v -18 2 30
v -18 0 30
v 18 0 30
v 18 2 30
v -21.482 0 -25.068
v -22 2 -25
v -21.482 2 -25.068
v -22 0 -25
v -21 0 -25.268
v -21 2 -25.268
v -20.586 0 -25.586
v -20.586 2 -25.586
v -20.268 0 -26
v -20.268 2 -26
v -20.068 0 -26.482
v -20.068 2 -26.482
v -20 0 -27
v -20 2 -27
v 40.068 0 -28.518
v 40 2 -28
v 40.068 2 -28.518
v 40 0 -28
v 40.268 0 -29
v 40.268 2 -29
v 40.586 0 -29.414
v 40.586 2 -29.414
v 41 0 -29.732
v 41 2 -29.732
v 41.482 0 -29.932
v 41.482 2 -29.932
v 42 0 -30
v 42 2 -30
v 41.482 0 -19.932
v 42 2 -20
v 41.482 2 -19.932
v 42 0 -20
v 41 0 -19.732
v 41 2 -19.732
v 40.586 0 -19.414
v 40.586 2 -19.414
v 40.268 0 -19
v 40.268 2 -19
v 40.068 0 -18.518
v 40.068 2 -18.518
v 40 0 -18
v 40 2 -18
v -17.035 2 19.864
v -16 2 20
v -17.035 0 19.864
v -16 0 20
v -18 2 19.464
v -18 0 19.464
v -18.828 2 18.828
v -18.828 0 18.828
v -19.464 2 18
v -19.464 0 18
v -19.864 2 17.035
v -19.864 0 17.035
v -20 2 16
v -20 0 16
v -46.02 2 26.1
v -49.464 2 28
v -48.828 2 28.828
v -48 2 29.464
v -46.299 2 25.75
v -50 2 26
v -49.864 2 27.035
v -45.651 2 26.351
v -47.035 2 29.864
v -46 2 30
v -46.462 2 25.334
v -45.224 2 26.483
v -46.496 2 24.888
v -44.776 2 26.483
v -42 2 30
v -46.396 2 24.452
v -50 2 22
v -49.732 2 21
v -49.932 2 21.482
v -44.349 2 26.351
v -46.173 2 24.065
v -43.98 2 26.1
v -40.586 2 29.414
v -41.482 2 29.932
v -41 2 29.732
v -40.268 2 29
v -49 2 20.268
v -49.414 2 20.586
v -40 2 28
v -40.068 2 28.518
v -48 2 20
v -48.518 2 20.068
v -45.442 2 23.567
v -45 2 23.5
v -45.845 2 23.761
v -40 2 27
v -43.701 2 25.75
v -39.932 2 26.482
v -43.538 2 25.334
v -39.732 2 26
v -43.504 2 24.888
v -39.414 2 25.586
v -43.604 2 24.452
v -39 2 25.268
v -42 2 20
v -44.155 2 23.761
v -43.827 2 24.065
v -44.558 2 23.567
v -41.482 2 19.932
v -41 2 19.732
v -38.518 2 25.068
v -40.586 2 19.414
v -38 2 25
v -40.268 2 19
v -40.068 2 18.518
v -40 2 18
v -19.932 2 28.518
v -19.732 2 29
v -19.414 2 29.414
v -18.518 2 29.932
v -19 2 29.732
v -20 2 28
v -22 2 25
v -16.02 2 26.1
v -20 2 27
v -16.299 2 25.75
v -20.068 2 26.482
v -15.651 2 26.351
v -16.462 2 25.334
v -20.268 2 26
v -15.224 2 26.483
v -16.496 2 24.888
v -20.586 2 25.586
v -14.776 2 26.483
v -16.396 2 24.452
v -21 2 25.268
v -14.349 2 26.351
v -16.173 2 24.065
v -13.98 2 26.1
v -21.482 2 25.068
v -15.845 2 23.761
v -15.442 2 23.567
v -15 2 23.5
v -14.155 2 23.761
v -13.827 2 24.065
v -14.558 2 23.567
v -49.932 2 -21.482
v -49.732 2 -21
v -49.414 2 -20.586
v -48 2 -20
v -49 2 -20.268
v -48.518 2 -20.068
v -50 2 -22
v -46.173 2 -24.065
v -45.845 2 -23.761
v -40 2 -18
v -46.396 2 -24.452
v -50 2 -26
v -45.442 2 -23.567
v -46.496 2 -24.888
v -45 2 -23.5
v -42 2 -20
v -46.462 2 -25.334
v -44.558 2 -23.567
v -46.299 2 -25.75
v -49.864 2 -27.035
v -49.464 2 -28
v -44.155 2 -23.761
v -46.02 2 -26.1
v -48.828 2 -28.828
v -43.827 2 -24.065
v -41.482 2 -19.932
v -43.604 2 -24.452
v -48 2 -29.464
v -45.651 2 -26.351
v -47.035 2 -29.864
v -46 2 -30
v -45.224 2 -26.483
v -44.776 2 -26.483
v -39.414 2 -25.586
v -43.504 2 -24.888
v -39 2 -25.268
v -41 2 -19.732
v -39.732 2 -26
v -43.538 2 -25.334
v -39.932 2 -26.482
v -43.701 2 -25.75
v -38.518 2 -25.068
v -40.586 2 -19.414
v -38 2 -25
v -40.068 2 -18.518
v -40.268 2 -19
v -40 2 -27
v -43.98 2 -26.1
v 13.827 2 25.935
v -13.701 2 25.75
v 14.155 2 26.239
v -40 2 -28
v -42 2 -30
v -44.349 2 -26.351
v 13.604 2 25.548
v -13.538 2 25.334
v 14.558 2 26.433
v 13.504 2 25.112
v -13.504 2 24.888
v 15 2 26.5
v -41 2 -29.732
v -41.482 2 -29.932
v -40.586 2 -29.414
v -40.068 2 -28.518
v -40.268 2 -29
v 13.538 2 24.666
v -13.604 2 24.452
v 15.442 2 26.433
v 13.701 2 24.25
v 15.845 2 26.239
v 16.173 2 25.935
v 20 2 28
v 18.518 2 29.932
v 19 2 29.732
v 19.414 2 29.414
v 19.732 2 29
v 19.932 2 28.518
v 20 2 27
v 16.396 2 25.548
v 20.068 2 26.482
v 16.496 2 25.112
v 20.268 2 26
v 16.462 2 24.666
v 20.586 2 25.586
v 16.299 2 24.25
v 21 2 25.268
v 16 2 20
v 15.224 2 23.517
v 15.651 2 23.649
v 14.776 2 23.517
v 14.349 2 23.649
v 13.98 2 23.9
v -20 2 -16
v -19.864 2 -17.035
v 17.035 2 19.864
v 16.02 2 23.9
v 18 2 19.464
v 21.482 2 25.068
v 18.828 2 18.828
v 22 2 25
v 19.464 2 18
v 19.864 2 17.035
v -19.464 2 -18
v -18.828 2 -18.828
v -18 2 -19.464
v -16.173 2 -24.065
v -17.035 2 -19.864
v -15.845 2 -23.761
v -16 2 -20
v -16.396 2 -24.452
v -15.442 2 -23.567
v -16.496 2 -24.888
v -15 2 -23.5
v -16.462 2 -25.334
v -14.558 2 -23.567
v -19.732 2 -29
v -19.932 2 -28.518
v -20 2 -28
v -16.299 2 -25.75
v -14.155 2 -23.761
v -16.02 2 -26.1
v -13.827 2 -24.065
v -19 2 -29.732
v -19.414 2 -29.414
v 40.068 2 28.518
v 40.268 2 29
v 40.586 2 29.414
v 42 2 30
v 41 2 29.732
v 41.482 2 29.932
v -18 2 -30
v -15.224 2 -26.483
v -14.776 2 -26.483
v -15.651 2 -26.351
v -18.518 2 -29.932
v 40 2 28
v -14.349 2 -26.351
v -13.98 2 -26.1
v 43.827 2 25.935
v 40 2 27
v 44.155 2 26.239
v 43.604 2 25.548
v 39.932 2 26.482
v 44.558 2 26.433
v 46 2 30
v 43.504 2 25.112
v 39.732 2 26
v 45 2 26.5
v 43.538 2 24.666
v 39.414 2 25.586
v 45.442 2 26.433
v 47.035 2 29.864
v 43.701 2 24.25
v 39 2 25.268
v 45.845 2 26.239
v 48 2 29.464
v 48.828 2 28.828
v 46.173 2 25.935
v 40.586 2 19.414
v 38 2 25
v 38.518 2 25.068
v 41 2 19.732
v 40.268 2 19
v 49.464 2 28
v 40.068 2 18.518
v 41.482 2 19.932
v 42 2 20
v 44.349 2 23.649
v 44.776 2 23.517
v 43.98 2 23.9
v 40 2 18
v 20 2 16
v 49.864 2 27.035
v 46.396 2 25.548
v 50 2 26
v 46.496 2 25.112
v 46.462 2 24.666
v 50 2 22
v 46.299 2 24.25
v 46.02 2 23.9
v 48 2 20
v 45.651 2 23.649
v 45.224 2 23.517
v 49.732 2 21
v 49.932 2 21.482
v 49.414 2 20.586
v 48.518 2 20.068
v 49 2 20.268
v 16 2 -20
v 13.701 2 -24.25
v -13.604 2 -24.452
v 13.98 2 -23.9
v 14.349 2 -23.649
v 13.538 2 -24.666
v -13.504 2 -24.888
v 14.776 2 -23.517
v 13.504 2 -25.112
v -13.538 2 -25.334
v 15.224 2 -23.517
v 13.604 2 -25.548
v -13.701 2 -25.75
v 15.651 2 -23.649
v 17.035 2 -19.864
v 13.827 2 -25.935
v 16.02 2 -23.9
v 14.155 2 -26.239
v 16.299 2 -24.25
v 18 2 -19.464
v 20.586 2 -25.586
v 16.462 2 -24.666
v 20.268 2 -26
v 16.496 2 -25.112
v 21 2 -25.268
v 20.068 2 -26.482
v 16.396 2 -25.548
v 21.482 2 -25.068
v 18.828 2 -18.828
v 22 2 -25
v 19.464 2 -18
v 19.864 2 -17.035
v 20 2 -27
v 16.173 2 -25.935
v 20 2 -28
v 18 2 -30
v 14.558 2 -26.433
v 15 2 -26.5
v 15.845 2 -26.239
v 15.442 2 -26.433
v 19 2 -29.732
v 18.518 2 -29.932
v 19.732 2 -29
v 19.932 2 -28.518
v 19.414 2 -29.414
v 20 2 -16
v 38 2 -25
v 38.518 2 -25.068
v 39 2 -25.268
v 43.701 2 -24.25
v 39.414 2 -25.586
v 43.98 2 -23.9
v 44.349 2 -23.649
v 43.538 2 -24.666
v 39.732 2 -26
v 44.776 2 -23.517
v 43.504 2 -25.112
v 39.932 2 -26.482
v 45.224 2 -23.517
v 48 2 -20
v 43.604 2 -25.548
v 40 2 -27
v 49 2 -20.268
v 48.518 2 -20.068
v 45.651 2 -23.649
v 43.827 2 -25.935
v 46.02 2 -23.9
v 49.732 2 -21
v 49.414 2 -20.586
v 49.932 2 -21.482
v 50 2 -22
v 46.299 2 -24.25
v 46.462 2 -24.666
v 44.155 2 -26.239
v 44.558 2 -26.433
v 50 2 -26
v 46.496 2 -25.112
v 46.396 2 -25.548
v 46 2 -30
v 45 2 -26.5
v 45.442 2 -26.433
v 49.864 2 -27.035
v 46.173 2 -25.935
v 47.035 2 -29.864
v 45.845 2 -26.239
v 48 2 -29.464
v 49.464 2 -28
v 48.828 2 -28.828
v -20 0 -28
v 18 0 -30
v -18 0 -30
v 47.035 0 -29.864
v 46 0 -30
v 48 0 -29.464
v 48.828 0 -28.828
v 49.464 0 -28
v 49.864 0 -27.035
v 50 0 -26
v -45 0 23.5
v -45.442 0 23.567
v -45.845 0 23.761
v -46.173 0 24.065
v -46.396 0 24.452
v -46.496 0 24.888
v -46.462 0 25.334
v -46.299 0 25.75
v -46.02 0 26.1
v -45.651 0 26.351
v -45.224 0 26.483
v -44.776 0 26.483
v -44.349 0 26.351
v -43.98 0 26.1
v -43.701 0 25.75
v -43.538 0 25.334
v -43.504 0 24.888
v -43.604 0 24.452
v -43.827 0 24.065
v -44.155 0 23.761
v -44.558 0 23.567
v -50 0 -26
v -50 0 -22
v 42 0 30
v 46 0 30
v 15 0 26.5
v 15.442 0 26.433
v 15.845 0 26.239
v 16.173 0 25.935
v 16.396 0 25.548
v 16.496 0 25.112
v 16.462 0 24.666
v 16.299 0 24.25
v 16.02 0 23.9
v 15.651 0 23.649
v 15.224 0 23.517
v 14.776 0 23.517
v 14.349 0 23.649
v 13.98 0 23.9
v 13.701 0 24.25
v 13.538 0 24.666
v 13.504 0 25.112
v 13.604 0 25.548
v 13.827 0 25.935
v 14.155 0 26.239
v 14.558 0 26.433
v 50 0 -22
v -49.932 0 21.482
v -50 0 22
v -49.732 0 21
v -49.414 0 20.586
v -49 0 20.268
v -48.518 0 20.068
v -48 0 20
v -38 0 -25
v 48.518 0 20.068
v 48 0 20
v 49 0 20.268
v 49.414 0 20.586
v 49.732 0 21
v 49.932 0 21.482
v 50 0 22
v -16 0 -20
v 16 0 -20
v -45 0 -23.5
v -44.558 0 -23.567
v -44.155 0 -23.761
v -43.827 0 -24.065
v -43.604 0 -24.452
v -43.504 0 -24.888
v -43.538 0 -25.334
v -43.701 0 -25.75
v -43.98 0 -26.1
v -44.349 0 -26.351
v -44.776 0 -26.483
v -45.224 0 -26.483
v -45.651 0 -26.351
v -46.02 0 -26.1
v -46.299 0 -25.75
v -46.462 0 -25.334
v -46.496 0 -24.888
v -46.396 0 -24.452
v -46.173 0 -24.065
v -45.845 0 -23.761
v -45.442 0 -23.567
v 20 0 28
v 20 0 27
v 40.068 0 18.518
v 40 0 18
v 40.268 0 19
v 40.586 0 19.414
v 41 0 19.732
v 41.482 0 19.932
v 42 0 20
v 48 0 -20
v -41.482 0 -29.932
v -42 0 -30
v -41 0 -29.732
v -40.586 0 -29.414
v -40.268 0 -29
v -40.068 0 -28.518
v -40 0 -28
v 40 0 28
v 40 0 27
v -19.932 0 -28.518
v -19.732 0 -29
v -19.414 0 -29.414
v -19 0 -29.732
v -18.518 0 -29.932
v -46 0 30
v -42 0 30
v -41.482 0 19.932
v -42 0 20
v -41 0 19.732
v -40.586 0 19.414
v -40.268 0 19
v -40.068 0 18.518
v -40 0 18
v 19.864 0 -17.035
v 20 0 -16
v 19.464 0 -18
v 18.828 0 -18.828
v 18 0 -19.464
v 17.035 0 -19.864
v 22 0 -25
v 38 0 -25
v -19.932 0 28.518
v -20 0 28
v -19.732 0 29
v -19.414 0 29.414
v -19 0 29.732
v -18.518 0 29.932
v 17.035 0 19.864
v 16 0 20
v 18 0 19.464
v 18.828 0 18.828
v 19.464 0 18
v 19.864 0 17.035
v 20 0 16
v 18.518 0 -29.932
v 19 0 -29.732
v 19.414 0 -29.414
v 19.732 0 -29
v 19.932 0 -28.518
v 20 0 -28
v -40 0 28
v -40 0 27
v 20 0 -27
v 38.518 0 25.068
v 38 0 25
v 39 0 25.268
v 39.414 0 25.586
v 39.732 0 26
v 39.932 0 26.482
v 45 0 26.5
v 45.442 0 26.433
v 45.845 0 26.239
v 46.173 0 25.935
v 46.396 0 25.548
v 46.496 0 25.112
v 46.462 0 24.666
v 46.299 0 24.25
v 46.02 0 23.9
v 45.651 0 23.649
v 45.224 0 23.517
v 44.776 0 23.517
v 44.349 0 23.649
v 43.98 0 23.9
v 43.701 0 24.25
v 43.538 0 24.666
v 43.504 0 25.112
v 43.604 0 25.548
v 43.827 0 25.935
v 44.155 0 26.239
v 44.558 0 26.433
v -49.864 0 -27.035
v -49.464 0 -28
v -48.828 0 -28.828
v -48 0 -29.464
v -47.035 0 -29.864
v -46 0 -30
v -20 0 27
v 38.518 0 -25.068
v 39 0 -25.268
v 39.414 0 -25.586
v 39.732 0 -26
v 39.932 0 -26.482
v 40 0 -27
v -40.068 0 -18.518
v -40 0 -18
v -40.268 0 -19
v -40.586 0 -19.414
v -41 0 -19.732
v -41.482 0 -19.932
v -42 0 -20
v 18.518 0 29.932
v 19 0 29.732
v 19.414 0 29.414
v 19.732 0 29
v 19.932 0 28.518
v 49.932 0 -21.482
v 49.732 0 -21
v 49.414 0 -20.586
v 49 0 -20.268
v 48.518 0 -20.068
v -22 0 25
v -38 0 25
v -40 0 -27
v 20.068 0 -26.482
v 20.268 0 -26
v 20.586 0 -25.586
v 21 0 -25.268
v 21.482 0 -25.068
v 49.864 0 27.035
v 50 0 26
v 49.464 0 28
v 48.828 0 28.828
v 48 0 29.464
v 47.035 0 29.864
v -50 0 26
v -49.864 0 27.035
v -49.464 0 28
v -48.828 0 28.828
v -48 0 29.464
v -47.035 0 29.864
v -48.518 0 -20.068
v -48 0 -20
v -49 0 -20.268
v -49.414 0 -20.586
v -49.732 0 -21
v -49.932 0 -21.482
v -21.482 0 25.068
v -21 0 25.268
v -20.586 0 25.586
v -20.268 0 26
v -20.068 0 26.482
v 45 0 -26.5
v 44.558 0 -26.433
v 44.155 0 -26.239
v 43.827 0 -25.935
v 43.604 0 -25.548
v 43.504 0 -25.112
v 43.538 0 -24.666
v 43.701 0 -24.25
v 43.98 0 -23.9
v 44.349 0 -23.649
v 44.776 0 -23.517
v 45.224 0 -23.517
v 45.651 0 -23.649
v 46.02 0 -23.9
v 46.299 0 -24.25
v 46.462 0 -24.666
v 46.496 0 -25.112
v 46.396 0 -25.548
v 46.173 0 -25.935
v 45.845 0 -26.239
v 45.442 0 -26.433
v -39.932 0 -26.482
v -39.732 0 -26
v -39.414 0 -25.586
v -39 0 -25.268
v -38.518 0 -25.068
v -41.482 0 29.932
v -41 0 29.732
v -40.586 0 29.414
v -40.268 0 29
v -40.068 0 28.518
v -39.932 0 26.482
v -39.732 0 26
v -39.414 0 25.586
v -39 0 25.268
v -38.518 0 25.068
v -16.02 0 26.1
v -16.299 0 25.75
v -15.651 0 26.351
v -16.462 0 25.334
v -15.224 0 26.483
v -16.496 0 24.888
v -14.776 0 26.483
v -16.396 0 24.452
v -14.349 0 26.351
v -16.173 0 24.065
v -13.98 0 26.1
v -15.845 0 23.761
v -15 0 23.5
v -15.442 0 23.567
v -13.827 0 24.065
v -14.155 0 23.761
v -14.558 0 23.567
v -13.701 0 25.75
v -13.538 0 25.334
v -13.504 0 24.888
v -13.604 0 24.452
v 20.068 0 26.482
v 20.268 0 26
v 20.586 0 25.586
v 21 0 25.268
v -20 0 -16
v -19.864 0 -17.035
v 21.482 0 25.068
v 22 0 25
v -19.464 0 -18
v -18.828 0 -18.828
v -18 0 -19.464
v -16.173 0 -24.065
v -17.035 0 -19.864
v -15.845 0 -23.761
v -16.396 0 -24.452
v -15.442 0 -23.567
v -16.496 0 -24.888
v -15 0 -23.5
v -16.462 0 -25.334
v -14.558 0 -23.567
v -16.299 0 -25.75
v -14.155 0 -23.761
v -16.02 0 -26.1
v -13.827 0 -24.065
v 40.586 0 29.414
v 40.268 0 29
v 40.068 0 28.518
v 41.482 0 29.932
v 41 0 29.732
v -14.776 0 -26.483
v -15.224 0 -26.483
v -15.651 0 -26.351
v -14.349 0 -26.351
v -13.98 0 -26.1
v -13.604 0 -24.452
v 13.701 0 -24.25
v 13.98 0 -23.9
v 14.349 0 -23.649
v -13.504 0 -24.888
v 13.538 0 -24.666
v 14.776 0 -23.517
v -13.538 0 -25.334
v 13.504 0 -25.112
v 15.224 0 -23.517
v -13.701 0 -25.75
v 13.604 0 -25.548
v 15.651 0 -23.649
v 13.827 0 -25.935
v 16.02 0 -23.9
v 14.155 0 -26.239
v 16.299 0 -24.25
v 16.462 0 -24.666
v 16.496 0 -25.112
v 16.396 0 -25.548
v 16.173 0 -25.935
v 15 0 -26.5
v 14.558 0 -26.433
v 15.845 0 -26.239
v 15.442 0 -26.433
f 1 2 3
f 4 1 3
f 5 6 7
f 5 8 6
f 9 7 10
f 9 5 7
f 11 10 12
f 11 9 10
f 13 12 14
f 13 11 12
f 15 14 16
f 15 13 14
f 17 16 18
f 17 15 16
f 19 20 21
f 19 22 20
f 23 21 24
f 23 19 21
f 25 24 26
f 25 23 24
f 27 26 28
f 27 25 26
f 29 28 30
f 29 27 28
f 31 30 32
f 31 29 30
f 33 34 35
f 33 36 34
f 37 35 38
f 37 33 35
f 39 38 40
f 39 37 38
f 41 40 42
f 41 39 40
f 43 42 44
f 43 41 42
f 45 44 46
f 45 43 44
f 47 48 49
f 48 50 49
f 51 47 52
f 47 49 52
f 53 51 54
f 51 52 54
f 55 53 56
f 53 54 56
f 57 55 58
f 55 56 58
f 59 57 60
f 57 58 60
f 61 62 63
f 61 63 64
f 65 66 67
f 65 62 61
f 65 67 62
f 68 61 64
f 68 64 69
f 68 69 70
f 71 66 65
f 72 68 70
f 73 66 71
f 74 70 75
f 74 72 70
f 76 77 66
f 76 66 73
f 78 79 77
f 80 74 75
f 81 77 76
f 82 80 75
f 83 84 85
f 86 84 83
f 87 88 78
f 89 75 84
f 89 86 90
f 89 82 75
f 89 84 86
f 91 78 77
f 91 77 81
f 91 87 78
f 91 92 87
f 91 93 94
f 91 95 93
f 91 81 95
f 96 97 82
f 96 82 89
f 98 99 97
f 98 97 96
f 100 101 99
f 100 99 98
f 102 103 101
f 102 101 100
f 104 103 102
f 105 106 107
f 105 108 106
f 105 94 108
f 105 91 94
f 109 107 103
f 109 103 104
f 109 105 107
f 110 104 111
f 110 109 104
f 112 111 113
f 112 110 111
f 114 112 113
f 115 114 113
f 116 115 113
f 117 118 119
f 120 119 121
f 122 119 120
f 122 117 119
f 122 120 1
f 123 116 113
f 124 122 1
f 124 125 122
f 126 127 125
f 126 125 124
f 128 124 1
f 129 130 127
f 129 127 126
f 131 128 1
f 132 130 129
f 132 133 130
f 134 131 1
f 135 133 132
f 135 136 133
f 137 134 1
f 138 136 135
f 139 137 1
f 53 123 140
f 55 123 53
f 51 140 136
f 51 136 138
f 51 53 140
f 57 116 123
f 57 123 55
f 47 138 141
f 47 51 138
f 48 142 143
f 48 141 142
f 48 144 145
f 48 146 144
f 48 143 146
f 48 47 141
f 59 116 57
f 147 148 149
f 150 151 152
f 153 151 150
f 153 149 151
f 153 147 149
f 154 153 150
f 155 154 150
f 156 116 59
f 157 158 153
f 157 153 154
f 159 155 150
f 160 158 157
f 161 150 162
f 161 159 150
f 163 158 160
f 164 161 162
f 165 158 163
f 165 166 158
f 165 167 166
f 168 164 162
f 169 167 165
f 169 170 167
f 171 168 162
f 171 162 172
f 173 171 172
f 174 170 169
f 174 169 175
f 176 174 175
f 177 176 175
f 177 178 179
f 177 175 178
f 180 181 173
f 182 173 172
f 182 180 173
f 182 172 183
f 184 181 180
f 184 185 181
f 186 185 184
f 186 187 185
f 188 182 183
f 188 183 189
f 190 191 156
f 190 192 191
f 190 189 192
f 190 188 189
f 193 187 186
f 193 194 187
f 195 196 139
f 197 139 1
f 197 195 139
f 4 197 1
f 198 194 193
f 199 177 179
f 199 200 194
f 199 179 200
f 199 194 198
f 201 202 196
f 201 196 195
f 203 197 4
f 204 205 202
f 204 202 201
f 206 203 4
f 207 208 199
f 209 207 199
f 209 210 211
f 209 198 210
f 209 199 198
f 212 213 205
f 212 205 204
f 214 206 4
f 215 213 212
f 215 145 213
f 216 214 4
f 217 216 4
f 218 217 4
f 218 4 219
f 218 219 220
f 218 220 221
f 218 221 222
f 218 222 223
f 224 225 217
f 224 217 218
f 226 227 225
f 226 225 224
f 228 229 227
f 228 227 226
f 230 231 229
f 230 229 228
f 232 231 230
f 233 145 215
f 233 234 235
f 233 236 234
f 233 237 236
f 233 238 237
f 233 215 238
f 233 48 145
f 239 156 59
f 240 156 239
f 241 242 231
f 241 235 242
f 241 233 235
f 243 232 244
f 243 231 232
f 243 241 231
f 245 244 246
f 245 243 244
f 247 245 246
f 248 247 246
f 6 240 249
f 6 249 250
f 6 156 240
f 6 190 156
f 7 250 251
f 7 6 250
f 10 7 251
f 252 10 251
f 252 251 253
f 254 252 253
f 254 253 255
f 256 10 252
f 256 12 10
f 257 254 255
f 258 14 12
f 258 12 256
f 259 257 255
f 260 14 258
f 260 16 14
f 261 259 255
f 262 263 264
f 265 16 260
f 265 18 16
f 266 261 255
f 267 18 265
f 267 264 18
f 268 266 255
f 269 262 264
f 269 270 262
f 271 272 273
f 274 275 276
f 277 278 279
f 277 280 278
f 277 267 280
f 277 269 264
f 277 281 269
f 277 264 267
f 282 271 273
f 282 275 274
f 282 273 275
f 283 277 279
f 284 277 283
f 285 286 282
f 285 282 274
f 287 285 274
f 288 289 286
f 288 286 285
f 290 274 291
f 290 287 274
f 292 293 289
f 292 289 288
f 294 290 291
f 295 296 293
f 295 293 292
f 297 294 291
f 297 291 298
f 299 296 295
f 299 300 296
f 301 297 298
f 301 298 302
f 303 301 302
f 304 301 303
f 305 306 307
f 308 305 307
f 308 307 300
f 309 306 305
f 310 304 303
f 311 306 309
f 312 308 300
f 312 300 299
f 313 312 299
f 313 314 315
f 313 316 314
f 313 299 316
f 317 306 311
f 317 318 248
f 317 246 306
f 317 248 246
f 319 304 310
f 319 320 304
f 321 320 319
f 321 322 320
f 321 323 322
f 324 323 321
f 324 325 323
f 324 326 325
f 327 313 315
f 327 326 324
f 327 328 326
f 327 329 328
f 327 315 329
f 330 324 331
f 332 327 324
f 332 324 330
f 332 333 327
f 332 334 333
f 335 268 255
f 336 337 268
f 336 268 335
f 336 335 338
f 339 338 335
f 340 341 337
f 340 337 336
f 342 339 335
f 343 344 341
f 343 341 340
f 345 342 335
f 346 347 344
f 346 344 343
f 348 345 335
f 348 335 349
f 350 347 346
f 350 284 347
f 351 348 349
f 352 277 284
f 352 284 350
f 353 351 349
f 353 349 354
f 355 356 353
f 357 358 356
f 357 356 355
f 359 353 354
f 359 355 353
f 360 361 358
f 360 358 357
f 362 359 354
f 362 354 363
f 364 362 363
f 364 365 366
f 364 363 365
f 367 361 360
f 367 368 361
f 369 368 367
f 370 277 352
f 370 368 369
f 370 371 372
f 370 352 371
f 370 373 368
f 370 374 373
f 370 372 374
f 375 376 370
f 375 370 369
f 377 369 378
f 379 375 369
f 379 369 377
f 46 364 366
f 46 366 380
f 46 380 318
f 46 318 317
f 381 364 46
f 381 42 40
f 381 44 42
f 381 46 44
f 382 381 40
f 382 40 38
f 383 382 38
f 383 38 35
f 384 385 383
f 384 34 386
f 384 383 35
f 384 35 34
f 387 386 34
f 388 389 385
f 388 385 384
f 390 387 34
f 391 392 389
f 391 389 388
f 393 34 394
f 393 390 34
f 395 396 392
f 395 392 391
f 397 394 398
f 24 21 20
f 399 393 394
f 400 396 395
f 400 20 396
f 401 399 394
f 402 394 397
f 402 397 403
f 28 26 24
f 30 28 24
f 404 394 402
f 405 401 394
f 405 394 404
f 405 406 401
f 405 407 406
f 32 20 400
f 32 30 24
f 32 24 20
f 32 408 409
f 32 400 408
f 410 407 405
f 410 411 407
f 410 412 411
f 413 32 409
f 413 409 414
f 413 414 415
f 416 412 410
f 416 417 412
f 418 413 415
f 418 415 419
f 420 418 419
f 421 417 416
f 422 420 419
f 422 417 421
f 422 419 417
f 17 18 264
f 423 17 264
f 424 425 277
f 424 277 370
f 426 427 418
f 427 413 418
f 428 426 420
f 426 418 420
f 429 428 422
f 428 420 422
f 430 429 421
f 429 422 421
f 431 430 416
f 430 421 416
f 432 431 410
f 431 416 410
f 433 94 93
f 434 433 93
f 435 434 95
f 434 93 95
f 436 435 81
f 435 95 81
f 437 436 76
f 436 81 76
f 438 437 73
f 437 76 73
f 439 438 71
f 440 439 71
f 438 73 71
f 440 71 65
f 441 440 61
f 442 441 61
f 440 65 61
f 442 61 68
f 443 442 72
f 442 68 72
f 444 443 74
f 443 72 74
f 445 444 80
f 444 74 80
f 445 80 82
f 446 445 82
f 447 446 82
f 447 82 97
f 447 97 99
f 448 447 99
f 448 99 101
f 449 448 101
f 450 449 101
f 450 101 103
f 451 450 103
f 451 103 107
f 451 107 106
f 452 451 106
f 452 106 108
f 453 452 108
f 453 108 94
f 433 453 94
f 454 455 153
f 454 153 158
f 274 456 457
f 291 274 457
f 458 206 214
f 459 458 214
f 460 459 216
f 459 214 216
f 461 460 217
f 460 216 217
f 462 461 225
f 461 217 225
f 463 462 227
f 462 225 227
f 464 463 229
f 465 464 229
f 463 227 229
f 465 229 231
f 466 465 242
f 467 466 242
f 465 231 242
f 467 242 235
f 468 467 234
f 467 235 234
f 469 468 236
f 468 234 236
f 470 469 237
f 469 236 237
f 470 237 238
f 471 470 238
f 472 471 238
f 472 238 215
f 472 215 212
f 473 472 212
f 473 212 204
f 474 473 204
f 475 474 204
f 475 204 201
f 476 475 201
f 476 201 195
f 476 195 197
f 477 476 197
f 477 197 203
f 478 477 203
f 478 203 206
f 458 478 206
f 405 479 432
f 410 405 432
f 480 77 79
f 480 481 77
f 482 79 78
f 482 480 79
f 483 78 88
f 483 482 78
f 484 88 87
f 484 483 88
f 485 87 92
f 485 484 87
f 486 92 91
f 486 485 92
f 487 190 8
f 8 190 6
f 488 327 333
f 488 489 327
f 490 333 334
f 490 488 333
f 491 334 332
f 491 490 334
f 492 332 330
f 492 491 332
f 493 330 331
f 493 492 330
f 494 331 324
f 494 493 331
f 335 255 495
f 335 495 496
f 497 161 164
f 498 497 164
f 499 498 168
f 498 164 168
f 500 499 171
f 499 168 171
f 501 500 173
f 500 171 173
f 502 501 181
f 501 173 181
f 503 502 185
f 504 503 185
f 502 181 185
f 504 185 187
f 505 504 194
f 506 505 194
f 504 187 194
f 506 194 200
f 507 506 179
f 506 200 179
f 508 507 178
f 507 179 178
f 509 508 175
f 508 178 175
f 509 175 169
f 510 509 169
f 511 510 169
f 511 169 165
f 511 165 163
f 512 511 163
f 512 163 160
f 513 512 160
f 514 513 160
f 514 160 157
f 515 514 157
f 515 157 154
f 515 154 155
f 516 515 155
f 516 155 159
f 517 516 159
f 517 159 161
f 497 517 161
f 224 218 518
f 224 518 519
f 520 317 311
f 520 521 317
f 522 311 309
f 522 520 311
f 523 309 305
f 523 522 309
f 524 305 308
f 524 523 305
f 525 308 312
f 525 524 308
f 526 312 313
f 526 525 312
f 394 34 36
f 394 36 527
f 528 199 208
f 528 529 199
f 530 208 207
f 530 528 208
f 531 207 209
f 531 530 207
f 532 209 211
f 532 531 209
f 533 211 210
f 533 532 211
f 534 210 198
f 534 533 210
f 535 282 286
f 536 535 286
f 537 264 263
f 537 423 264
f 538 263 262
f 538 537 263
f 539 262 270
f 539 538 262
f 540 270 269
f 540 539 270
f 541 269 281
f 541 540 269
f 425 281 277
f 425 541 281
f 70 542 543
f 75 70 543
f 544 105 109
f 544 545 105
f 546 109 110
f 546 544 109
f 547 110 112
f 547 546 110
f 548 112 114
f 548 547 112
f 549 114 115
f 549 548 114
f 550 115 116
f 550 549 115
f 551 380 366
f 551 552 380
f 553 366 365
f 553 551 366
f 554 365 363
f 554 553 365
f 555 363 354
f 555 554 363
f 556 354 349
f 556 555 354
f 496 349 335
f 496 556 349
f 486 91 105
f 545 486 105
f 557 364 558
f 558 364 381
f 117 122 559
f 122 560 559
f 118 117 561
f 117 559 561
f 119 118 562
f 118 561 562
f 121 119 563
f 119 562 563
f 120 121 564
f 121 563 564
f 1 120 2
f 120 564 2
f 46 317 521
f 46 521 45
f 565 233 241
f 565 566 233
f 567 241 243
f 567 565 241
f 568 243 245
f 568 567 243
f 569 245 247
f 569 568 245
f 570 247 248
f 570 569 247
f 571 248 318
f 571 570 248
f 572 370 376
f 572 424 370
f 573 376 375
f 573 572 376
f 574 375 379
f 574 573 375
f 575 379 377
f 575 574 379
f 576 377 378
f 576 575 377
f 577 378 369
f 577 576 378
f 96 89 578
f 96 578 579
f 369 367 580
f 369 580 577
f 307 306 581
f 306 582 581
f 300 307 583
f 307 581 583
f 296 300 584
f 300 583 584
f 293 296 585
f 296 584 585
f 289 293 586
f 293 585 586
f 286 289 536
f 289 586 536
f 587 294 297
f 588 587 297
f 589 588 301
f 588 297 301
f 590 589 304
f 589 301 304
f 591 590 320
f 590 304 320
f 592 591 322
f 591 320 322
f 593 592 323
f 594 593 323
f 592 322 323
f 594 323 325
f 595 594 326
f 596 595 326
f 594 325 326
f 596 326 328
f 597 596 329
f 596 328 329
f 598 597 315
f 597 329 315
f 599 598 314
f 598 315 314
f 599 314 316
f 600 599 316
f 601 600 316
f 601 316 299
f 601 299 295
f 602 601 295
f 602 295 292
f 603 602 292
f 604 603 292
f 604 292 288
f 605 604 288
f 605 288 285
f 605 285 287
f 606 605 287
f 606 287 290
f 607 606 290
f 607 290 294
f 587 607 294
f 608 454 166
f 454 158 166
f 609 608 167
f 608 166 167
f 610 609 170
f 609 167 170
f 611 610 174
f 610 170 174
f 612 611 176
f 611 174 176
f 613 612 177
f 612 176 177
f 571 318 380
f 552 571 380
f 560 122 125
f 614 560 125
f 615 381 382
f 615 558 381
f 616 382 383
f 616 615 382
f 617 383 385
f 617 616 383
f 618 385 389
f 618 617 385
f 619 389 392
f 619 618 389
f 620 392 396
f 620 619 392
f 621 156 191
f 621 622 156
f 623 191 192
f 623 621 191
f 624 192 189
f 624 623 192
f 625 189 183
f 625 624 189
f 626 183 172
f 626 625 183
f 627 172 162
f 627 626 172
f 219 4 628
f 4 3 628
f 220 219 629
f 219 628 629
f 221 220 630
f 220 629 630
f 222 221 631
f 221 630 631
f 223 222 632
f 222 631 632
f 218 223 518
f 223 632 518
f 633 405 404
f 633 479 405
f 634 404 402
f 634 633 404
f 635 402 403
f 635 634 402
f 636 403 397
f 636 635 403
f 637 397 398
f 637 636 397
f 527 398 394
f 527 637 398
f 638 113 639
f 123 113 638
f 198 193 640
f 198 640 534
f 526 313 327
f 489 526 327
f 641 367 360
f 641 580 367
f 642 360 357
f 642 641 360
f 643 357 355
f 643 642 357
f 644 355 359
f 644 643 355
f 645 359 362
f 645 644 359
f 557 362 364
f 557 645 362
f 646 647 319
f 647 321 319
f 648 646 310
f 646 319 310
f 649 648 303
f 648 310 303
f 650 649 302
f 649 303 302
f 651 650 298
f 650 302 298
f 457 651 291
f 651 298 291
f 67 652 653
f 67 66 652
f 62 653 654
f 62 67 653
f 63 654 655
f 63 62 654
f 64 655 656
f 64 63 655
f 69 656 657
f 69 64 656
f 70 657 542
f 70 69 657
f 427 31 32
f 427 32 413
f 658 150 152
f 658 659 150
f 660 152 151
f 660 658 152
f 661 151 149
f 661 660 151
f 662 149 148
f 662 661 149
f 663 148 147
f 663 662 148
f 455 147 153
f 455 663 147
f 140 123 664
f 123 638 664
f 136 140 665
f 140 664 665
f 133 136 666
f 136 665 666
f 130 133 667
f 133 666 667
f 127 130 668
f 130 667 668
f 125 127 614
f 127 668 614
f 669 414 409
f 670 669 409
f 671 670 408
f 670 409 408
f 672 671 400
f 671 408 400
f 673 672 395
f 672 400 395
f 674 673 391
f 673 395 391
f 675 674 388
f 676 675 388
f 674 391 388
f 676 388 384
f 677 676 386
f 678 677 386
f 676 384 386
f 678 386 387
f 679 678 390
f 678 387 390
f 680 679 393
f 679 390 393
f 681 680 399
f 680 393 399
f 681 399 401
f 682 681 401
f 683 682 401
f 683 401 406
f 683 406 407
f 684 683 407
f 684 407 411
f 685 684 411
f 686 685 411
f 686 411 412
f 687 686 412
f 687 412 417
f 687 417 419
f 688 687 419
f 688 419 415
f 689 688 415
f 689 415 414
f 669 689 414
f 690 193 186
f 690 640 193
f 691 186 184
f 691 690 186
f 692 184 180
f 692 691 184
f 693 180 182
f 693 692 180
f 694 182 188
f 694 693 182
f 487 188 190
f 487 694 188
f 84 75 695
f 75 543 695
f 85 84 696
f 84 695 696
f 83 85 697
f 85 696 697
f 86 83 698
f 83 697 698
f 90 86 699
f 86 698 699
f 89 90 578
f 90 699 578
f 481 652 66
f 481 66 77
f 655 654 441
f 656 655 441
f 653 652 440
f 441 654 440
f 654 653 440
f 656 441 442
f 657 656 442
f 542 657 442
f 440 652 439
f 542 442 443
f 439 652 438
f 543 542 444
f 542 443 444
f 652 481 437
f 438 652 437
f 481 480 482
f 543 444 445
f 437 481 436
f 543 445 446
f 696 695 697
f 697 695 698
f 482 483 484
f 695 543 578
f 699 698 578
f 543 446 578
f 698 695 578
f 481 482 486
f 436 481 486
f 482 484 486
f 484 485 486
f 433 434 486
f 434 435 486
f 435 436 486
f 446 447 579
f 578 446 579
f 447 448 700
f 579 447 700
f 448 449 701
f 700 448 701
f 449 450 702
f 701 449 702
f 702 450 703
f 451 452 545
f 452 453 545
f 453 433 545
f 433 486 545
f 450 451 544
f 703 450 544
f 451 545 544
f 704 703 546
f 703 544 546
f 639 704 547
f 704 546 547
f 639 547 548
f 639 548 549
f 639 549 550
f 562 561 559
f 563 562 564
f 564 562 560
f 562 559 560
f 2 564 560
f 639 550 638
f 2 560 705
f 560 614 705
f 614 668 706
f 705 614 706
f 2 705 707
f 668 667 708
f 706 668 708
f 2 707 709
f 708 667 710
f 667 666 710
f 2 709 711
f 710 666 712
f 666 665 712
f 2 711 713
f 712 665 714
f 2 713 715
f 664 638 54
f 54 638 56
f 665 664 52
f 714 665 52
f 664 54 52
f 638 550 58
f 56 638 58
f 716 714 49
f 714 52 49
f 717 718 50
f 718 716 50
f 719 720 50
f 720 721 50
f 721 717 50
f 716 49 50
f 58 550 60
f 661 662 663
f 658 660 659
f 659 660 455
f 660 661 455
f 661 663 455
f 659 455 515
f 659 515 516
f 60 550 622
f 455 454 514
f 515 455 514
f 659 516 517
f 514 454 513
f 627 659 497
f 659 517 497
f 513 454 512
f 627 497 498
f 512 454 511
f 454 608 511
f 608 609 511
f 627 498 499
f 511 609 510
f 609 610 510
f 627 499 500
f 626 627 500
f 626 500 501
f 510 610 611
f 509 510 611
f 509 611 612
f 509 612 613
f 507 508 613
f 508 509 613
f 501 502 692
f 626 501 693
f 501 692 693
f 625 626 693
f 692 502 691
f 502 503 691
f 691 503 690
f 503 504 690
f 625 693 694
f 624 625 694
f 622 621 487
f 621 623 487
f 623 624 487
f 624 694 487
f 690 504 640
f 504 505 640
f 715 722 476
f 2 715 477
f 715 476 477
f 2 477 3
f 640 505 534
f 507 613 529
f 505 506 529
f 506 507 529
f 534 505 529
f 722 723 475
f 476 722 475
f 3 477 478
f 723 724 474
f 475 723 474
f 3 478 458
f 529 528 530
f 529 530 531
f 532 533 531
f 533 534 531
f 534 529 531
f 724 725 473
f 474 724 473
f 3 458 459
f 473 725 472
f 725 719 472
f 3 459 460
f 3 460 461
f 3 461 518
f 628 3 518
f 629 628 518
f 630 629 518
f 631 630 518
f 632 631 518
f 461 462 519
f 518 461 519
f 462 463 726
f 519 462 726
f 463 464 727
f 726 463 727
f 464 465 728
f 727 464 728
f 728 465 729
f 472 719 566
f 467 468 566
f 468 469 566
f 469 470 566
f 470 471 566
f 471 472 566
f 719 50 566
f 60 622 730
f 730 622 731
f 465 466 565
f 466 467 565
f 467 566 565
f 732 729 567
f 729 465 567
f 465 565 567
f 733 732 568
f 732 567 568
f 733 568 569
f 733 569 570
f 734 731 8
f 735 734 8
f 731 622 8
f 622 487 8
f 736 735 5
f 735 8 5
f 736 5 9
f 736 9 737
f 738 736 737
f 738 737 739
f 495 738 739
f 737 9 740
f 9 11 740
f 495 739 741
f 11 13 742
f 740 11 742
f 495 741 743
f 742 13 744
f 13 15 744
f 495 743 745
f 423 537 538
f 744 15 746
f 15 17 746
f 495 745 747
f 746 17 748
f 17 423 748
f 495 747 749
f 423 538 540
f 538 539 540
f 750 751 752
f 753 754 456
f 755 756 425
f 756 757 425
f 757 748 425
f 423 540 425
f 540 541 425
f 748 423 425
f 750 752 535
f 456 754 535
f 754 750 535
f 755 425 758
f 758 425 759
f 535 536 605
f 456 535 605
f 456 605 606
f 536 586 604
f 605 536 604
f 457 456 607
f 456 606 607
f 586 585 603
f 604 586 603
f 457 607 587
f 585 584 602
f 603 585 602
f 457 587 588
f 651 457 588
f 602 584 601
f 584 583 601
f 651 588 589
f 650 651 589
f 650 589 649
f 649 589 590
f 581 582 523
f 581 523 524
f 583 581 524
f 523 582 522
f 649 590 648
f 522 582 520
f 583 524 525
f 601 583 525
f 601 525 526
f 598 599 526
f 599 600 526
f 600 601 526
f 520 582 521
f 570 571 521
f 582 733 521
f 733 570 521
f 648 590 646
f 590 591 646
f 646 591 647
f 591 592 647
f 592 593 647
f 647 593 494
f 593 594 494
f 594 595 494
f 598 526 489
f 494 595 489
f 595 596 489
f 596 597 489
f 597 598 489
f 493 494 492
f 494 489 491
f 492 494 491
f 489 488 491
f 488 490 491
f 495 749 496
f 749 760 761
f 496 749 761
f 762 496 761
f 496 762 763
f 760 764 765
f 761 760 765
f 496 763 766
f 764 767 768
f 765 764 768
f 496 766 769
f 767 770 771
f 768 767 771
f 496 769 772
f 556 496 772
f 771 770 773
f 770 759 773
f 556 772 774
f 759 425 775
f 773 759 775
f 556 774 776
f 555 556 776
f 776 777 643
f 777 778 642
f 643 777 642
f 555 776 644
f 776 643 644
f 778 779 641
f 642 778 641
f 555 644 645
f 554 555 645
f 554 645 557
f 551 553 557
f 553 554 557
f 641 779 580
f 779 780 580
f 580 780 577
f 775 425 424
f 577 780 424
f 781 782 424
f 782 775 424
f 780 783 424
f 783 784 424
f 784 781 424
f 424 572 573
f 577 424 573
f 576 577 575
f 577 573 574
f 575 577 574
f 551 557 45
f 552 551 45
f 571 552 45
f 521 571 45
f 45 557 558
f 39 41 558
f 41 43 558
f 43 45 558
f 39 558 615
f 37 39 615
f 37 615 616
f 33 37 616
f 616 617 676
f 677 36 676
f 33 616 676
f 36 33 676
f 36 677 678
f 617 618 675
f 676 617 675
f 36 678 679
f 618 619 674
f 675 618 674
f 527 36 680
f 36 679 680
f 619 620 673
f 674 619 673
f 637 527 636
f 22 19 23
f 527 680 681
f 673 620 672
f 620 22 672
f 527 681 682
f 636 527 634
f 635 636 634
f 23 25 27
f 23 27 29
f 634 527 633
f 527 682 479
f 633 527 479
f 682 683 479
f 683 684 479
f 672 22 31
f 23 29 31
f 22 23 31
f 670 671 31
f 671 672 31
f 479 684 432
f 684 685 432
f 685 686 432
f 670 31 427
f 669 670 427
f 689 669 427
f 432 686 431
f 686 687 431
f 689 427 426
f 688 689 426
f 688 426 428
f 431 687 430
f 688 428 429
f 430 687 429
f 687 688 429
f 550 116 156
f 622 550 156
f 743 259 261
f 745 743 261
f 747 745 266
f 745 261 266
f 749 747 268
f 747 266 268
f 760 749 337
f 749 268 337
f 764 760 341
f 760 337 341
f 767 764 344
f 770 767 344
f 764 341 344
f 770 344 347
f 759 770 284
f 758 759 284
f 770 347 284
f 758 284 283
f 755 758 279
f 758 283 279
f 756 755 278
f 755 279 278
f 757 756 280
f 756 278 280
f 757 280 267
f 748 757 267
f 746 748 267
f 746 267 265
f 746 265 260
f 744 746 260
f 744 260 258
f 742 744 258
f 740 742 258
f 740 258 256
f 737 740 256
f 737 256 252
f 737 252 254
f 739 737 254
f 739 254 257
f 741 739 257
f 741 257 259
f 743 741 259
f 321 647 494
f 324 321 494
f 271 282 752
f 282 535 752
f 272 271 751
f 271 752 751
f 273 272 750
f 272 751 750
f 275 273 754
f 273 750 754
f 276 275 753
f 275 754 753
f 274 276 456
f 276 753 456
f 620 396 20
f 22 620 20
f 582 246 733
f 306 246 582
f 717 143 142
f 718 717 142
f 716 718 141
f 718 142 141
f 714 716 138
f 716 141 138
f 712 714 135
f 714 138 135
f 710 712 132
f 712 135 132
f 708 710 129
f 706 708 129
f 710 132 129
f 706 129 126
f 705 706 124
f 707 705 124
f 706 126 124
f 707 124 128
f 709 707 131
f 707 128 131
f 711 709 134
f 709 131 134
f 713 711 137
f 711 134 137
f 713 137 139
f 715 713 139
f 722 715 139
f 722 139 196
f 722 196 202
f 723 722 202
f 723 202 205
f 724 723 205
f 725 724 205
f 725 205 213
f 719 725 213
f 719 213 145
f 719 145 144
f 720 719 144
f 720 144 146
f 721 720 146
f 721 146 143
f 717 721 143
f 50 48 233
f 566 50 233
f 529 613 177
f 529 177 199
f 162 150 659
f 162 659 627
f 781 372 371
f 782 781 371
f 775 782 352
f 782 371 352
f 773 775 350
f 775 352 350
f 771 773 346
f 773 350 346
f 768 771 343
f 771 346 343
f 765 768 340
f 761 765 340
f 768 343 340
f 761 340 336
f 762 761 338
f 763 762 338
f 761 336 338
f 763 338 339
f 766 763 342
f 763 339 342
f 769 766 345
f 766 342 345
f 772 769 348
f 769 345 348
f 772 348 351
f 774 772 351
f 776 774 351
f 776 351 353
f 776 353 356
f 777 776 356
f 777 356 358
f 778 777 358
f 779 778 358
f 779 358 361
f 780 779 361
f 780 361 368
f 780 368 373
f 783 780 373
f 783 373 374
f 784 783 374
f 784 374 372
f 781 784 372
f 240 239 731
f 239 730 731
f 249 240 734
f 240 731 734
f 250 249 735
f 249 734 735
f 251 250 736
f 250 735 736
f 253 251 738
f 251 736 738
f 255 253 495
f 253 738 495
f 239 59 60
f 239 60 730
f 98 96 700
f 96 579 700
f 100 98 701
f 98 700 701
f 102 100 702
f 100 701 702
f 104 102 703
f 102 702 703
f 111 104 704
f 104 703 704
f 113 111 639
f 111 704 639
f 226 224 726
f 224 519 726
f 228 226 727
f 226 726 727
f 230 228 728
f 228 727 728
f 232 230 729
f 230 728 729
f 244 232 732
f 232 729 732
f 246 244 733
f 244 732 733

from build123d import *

# Parameters (mm, degrees)
SKETCH_1_W          = 100
SKETCH_1_H          = 60
EXTRUDE_1_DEPTH     = 2
SKETCH_4_W          = 40
SKETCH_4_H          = 40
CUT_EXTRUDE_3_DEPTH = 59.343808583
SKETCH_6_R          = 1.5
CUT_EXTRUDE_5_DEPTH = 59.343808583
SKETCH_7_W          = 20
SKETCH_7_H          = 5
CUT_EXTRUDE_6_DEPTH = 59.343808583
FILLET_1_R          = 4
FILLET_2_R          = 2
SKETCH_8_R          = 1.5
CUT_EXTRUDE_7_DEPTH = 59.343808583
SKETCH_9_W          = 10
SKETCH_9_H          = 40
CUT_EXTRUDE_9_DEPTH = 59.343808583
FILLET_3_R          = 2


with BuildPart() as part:
    # 草图1 → 凸台-拉伸1 (new body)
    with BuildSketch(Plane(origin=(0, 0, 0), x_dir=(1, 0, 0), z_dir=(0, 1, 0))):
        Rectangle(SKETCH_1_W, SKETCH_1_H)
    extrude(amount=EXTRUDE_1_DEPTH)

    # 草图4 → 切除-拉伸3 (cut, through all)
    with BuildSketch(Plane(origin=(0, 2, 0), x_dir=(1, 0, 0), z_dir=(0, 1, 0))):
        Rectangle(SKETCH_4_W, SKETCH_4_H)
    extrude(amount=-CUT_EXTRUDE_3_DEPTH, mode=Mode.SUBTRACT)

    # 草图6 → 切除-拉伸5 (cut, through all)
    with BuildSketch(Plane(origin=(0, 2, 0), x_dir=(1, 0, 0), z_dir=(0, 1, 0))):
        with Locations(Location((-45, 25, 0), (0, 0, 270))):
            Circle(SKETCH_6_R)
        with Locations(Location((-45, -25, 0), (0, 0, 90))):
            Circle(SKETCH_6_R)
        with Locations(Location((45, -25, 0), (0, 0, 270))):
            Circle(SKETCH_6_R)
        with Locations(Location((45, 25, 0), (0, 0, 90))):
            Circle(SKETCH_6_R)
    extrude(amount=-CUT_EXTRUDE_5_DEPTH, mode=Mode.SUBTRACT)

    # 草图7 → 切除-拉伸6 (cut, through all)
    with BuildSketch(Plane(origin=(0, 2, 0), x_dir=(1, 0, 0), z_dir=(0, 1, 0))):
        with Locations((-30, 27.5)):
            Rectangle(SKETCH_7_W, SKETCH_7_H)
        with Locations((-30, -27.5)):
            Rectangle(SKETCH_7_W, SKETCH_7_H)
        with Locations((30, -27.5)):
            Rectangle(SKETCH_7_W, SKETCH_7_H)
        with Locations((30, 27.5)):
            Rectangle(SKETCH_7_W, SKETCH_7_H)
    extrude(amount=-CUT_EXTRUDE_6_DEPTH, mode=Mode.SUBTRACT)

    # 圆角1
    fillet_1_edges = [part.edges().sort_by_distance(p)[0] for p in [
        (20, 1, -20),
        (20, 1, 20),
        (-20, 1, 20),
        (-20, 1, -20),
        (50, 1, 30),
        (-50, 1, 30),
        (-50, 1, -30),
        (50, 1, -30),
    ]]
    fillet(fillet_1_edges, radius=FILLET_1_R)

    # 圆角2
    fillet_2_edges = [part.edges().sort_by_distance(p)[0] for p in [
        (40, 1, -30),
        (40, 1, -25),
        (20, 1, -25),
        (20, 1, -30),
        (40, 1, 30),
        (20, 1, 30),
        (20, 1, 25),
        (40, 1, 25),
        (-40, 1, 30),
        (-40, 1, 25),
        (-20, 1, 25),
        (-20, 1, 30),
        (-40, 1, -25),
        (-40, 1, -30),
        (-20, 1, -30),
        (-20, 1, -25),
    ]]
    fillet(fillet_2_edges, radius=FILLET_2_R)

    # 草图8 → 切除-拉伸7 (cut, through all)
    with BuildSketch(Plane(origin=(0, 2, 0), x_dir=(1, 0, 0), z_dir=(0, 1, 0))):
        with Locations(Location((-15, 25, 0), (0, 0, 270))):
            Circle(SKETCH_8_R)
        with Locations(Location((-15, -25, 0), (0, 0, 90))):
            Circle(SKETCH_8_R)
        with Locations(Location((15, -25, 0), (0, 0, 270))):
            Circle(SKETCH_8_R)
        with Locations(Location((15, 25, 0), (0, 0, 90))):
            Circle(SKETCH_8_R)
    extrude(amount=-CUT_EXTRUDE_7_DEPTH, mode=Mode.SUBTRACT)

    # 草图9 → 切除-拉伸9 (cut, through all)
    with BuildSketch(Plane(origin=(0, 2, 0), x_dir=(1, 0, 0), z_dir=(0, 1, 0))):
        with Locations((-45, 0)):
            Rectangle(SKETCH_9_W, SKETCH_9_H)
        with Locations((45, 0)):
            Rectangle(SKETCH_9_W, SKETCH_9_H)
    extrude(amount=-CUT_EXTRUDE_9_DEPTH, mode=Mode.SUBTRACT)

    # 圆角3
    fillet_3_edges = [part.edges().sort_by_distance(p)[0] for p in [
        (-50, 1, 20),
        (-50, 1, -20),
        (-40, 1, -20),
        (-40, 1, 20),
        (50, 1, -20),
        (50, 1, 20),
        (40, 1, 20),
        (40, 1, -20),
    ]]
    fillet(fillet_3_edges, radius=FILLET_3_R)


solid = part.part
